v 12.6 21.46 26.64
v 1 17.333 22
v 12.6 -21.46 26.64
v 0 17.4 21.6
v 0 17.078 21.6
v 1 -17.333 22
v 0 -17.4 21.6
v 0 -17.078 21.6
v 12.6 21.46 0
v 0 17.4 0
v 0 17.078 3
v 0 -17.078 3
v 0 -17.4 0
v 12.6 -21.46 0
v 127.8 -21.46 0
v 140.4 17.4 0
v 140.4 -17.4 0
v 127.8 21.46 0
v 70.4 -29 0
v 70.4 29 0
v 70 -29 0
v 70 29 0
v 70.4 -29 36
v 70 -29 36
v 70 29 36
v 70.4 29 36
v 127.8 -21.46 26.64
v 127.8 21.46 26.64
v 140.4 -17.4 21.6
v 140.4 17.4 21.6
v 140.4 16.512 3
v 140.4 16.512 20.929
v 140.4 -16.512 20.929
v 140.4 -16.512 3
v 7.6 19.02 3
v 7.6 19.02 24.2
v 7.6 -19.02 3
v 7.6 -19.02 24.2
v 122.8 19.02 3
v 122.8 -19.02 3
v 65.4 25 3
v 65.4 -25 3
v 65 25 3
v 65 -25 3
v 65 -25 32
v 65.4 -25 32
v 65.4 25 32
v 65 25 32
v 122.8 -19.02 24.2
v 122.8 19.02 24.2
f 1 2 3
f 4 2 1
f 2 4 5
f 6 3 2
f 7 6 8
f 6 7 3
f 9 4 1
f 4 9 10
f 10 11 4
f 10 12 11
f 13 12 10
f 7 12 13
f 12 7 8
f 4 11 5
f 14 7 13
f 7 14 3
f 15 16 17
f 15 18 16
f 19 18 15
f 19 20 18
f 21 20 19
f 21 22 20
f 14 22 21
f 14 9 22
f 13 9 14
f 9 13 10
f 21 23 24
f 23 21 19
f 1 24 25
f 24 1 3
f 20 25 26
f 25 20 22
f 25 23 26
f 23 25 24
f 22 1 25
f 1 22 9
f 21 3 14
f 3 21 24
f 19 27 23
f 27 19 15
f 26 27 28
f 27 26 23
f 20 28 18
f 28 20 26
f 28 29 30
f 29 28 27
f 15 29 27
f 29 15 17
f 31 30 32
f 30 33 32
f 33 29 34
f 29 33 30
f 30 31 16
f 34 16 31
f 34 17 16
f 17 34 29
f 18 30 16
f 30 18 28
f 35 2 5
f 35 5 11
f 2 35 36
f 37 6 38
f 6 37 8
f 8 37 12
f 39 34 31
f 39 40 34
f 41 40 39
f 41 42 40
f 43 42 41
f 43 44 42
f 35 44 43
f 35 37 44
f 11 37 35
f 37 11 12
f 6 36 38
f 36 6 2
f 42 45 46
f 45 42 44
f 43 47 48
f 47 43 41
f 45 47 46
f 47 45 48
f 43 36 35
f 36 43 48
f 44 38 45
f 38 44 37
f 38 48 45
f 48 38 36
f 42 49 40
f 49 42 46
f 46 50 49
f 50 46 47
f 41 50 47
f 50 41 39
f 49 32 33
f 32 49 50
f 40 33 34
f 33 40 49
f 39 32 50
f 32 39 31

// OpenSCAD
$fn = 32;
// ----------------------------------------------------------------------
// Faired channel: 140 x 58 x 36 mm, 4 mm walls, faired ends
// ----------------------------------------------------------------------

// --- parameters (mm) ---
length = 140;             // channel length
width = 58;               // channel width at mid length
height = 36;              // channel height at mid length
wall = 4;                 // side wall thickness
floor_t = 3;              // floor thickness
end_w = 34.8;             // faired end width
end_h = 21.6;             // faired end height

difference() {
  union() {
    hull() {
      translate([0, -17.4, 0]) cube([0.4, 34.8, 21.6]);
      translate([12.6, -21.46, 0]) cube([0.4, 42.92, 26.64]);
    }
    hull() {
      translate([12.6, -21.46, 0]) cube([0.4, 42.92, 26.64]);
      translate([70, -29, 0]) cube([0.4, 58, 36]);
    }
    hull() {
      translate([70, -29, 0]) cube([0.4, 58, 36]);
      translate([127.4, -21.46, 0]) cube([0.4, 42.92, 26.64]);
    }
    hull() {
      translate([127.4, -21.46, 0]) cube([0.4, 42.92, 26.64]);
      translate([140, -17.4, 0]) cube([0.4, 34.8, 21.6]);
    }
  }
  /* cavity, 5 mm proud of both ends so the ports are cut clean */
  hull() {
    translate([-5, -15.8, 3]) cube([0.4, 31.6, 17]);
    translate([7.6, -19.02, 3]) cube([0.4, 38.04, 21.2]);
  }
  hull() {
    translate([7.6, -19.02, 3]) cube([0.4, 38.04, 21.2]);
    translate([65, -25, 3]) cube([0.4, 50, 29]);
  }
  hull() {
    translate([65, -25, 3]) cube([0.4, 50, 29]);
    translate([122.4, -19.02, 3]) cube([0.4, 38.04, 21.2]);
  }
  hull() {
    translate([122.4, -19.02, 3]) cube([0.4, 38.04, 21.2]);
    translate([145, -15.8, 3]) cube([0.4, 31.6, 17]);
  }
}
